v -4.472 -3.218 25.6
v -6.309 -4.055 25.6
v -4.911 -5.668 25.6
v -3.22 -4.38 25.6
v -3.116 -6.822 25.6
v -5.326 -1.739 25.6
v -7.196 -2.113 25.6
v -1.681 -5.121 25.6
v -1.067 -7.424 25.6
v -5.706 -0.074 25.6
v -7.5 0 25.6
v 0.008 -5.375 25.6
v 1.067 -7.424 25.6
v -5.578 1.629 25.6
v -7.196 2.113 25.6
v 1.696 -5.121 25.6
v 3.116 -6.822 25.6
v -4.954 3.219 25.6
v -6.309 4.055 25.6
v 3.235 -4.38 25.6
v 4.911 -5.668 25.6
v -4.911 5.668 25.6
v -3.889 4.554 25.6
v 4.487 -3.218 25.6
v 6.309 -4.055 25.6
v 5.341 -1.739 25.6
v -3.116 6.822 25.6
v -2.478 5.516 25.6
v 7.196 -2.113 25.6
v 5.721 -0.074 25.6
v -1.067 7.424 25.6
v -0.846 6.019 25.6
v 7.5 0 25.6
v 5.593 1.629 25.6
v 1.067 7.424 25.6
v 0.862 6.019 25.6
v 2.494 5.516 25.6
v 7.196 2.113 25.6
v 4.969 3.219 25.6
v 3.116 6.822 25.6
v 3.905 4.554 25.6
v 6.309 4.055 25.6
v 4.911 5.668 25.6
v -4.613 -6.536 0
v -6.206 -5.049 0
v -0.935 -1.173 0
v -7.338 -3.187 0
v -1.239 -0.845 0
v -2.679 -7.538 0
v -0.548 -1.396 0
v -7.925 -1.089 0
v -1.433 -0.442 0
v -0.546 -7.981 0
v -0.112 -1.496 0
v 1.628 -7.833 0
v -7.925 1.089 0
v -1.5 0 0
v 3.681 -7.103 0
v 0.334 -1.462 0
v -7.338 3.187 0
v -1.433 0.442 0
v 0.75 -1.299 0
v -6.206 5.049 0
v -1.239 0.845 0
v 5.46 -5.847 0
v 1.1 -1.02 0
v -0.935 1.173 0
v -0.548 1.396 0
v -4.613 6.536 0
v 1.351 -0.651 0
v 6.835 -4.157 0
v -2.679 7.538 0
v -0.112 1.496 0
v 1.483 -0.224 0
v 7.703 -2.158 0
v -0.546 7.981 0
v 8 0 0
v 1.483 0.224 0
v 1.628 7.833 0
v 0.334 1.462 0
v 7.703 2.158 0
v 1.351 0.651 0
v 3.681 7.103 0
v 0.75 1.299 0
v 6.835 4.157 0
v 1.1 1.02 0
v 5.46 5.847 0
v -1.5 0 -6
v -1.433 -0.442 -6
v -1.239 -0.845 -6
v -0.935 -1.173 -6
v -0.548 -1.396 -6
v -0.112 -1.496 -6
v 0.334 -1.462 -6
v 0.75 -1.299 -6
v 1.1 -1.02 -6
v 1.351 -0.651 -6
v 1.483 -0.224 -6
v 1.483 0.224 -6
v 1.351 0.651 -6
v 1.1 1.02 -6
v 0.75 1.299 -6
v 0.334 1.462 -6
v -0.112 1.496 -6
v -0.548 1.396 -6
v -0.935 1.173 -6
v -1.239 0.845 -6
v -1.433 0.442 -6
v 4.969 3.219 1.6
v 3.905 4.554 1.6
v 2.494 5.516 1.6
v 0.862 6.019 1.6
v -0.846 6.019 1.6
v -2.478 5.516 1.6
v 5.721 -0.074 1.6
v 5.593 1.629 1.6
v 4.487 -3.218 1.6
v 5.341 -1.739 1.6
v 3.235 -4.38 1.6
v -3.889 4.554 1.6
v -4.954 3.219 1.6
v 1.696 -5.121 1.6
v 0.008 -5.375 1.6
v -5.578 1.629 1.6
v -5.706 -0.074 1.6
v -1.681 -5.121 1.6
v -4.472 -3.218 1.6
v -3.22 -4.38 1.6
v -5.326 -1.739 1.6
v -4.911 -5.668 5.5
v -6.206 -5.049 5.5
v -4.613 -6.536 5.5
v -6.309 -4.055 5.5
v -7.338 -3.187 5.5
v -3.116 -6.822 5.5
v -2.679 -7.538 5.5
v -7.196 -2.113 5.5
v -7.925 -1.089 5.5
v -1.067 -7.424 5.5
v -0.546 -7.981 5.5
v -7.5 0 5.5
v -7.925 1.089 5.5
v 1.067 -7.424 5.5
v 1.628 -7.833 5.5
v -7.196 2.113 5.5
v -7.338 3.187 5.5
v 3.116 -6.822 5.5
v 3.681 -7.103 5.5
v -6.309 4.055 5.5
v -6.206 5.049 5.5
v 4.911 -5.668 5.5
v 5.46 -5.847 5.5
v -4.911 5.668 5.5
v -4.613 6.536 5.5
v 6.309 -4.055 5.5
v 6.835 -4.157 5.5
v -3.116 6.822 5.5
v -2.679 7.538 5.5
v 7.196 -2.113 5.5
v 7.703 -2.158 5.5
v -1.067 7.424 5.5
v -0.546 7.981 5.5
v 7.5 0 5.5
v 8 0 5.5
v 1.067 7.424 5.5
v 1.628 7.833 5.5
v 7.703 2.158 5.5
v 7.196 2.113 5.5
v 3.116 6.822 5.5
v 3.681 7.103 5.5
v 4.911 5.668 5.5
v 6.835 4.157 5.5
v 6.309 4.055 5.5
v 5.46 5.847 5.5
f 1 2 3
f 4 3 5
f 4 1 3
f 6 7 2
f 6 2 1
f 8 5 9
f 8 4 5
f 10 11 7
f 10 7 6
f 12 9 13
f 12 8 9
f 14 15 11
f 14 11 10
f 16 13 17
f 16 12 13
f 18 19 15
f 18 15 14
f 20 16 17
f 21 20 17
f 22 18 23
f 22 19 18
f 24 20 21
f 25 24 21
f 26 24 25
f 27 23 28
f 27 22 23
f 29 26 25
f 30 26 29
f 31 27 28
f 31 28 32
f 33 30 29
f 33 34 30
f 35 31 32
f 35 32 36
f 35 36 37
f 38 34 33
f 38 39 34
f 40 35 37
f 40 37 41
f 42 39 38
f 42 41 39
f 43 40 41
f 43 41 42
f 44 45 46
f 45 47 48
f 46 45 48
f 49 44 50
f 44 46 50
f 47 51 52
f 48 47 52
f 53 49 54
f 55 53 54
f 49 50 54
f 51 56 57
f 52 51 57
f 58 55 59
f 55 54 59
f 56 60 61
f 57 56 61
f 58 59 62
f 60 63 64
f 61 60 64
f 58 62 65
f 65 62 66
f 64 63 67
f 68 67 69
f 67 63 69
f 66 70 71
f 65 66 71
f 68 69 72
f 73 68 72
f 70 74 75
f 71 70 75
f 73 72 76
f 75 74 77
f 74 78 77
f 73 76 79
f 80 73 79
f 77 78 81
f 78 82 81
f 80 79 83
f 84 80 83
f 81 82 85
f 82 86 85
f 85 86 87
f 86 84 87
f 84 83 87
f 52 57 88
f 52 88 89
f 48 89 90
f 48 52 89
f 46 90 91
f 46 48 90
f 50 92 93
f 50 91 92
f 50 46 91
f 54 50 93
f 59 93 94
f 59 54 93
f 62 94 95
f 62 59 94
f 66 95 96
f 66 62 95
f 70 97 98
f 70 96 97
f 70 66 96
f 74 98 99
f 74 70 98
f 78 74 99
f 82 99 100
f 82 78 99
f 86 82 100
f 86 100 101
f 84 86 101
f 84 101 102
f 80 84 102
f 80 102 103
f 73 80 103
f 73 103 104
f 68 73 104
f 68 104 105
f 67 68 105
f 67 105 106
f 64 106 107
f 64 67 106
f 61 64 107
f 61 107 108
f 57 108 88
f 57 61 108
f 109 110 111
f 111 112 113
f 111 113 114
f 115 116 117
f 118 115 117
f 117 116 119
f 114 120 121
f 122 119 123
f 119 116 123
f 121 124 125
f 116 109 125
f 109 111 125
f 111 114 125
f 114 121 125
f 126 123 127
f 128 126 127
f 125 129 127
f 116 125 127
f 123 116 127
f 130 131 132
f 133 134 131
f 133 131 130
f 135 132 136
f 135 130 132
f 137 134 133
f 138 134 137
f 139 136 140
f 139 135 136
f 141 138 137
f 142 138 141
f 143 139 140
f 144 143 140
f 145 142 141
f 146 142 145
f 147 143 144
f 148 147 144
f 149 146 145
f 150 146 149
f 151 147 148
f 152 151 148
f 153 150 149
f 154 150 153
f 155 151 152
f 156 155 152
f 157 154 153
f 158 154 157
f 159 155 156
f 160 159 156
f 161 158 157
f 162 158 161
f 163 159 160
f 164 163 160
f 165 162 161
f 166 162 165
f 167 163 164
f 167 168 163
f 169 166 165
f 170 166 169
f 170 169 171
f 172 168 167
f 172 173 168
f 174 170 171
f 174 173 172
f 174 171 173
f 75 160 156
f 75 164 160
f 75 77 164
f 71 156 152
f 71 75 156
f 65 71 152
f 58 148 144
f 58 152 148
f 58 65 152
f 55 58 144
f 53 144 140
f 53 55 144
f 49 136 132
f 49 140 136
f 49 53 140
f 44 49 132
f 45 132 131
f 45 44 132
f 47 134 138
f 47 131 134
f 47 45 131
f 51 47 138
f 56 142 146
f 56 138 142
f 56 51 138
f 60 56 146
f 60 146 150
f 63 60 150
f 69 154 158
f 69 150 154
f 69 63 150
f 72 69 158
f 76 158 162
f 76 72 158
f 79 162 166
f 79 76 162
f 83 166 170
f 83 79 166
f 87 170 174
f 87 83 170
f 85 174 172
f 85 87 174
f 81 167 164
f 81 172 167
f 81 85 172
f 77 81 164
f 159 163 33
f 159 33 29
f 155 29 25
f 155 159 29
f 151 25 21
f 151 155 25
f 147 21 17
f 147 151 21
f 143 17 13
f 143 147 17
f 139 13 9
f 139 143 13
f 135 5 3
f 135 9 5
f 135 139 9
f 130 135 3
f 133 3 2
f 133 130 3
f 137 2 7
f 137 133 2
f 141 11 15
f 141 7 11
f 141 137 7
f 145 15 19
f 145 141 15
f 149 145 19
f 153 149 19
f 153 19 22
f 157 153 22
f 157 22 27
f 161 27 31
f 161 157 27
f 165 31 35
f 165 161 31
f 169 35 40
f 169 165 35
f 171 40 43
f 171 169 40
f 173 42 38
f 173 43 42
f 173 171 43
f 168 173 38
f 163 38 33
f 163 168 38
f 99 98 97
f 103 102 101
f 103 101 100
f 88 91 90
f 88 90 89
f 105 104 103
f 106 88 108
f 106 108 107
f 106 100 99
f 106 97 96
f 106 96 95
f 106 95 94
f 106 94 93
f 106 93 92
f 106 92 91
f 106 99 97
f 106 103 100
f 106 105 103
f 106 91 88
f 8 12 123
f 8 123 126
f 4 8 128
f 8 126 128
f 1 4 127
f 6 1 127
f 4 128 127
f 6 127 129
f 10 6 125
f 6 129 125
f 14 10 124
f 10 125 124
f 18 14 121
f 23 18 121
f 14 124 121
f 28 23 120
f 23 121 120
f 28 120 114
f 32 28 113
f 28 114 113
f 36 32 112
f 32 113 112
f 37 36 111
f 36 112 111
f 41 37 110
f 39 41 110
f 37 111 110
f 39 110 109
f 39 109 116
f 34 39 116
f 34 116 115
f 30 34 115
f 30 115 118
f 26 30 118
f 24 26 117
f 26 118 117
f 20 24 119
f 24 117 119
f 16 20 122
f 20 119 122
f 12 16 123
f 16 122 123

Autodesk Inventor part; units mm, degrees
ref_plane "YZ Plane" through (0, 0, 0) normal (1, 0, 0) x (0, 1, 0)
ref_plane "XZ Plane" through (0, 0, 0) normal (0, 1, 0) x (-1, 0, 0)
ref_plane "XY Plane" through (0, 0, 0) normal (0, 0, 1) x (1, 0, 0)
sketch "Sketch1" plane through (0, 0, 0) normal (0, 0, 1) x (1, 0, 0)
  circle A0 centre (0, 0) radius 8
  dimension "d0" = 16
extrude "Extrusion1" add sketch "Sketch1" along normal blind 5.5
sketch "Sketch2" plane through (0, 0, 5.5) normal (0, 0, 1) x (1, 0, 0)
  circle A0 centre (0, 0) radius 7.5
  dimension "d3" = 15
extrude "Extrusion2" add sketch "Sketch2" along normal blind 20.1
sketch "Sketch3" plane through (0, 0, 0) normal (0, 0, -1) x (-1, 0, 0)
  circle A0 centre (0, 0) radius 1.5
  dimension "d6" = 3
extrude "Extrusion3" add sketch "Sketch3" along normal blind 6
sketch "Sketch4" plane through (0, 0, 25.6) normal (0, 0, 1) x (1, 0, 0)
  point P0 (0, 0)
  point P1 (0.0077, 0.354)
hole "Hole1" at (0.0077, 0.354, 25.6) direction (0, 0, -1) diameter 11.4587 depth 24 thread size "M12x0.5" class "6H" standard "ISO Metric profile"
properties part number "shaft"
